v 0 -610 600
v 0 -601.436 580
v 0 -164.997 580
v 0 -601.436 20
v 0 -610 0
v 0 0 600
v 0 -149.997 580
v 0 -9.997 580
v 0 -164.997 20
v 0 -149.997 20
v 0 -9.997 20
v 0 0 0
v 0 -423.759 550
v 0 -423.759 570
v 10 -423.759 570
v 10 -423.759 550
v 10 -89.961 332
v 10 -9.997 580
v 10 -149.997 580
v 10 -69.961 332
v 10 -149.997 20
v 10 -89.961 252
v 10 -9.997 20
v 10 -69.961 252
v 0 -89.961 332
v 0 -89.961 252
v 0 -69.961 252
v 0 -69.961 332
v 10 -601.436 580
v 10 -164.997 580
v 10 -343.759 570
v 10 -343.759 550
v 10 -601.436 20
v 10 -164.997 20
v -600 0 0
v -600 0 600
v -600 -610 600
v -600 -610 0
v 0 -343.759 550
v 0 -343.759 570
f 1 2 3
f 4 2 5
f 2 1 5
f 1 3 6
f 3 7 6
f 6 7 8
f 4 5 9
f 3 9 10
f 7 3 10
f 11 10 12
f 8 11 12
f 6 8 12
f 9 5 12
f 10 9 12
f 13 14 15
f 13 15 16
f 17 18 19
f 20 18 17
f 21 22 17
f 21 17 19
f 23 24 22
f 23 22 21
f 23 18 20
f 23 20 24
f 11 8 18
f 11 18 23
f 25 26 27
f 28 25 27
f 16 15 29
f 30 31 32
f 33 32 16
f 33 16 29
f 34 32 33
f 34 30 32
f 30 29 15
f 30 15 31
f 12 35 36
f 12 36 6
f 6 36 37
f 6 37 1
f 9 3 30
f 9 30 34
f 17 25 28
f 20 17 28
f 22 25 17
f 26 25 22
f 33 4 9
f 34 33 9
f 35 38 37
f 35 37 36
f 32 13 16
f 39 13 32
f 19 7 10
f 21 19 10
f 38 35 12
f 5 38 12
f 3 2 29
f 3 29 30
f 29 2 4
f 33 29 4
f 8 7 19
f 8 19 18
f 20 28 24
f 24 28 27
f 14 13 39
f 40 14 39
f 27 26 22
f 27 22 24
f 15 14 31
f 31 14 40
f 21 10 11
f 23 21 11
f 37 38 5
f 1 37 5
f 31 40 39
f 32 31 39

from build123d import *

# Parameters (mm, degrees)
SKETCH1_W           = 600
SKETCH1_H           = 610
BOSS_EXTRUDE1_DEPTH = 600
SKETCH2_W           = 560
SKETCH2_H           = 140
SKETCH2_W_2         = 80
SKETCH2_H_2         = 20
SKETCH2_H_3         = 436.439883301
SKETCH2_W_3         = 20
SKETCH2_H_4         = 80
BOSS_EXTRUDE2_DEPTH = 10


with BuildPart() as part:
    # Sketch1 → Boss-Extrude1 (new body)
    with BuildSketch(Plane.XY):
        with Locations((-300, -305)):
            Rectangle(SKETCH1_W, SKETCH1_H)
    extrude(amount=BOSS_EXTRUDE1_DEPTH)

    # Sketch2 → Boss-Extrude2 (add)
    with BuildSketch(Plane(origin=(0, 0, 0), x_dir=(0, 0, -1), z_dir=(1, 0, 0))):
        with Locations((-300, -79.996604702)):
            Rectangle(SKETCH2_W, SKETCH2_H)
        with Locations((-292, -79.960529666)):
            Rectangle(SKETCH2_W_2, SKETCH2_H_2, mode=Mode.SUBTRACT)
        with Locations((-300, -383.216546353)):
            Rectangle(SKETCH2_W, SKETCH2_H_3)
        with Locations((-560, -383.759018759)):
            Rectangle(SKETCH2_W_3, SKETCH2_H_4, mode=Mode.SUBTRACT)
    extrude(amount=BOSS_EXTRUDE2_DEPTH)


solid = part.part
